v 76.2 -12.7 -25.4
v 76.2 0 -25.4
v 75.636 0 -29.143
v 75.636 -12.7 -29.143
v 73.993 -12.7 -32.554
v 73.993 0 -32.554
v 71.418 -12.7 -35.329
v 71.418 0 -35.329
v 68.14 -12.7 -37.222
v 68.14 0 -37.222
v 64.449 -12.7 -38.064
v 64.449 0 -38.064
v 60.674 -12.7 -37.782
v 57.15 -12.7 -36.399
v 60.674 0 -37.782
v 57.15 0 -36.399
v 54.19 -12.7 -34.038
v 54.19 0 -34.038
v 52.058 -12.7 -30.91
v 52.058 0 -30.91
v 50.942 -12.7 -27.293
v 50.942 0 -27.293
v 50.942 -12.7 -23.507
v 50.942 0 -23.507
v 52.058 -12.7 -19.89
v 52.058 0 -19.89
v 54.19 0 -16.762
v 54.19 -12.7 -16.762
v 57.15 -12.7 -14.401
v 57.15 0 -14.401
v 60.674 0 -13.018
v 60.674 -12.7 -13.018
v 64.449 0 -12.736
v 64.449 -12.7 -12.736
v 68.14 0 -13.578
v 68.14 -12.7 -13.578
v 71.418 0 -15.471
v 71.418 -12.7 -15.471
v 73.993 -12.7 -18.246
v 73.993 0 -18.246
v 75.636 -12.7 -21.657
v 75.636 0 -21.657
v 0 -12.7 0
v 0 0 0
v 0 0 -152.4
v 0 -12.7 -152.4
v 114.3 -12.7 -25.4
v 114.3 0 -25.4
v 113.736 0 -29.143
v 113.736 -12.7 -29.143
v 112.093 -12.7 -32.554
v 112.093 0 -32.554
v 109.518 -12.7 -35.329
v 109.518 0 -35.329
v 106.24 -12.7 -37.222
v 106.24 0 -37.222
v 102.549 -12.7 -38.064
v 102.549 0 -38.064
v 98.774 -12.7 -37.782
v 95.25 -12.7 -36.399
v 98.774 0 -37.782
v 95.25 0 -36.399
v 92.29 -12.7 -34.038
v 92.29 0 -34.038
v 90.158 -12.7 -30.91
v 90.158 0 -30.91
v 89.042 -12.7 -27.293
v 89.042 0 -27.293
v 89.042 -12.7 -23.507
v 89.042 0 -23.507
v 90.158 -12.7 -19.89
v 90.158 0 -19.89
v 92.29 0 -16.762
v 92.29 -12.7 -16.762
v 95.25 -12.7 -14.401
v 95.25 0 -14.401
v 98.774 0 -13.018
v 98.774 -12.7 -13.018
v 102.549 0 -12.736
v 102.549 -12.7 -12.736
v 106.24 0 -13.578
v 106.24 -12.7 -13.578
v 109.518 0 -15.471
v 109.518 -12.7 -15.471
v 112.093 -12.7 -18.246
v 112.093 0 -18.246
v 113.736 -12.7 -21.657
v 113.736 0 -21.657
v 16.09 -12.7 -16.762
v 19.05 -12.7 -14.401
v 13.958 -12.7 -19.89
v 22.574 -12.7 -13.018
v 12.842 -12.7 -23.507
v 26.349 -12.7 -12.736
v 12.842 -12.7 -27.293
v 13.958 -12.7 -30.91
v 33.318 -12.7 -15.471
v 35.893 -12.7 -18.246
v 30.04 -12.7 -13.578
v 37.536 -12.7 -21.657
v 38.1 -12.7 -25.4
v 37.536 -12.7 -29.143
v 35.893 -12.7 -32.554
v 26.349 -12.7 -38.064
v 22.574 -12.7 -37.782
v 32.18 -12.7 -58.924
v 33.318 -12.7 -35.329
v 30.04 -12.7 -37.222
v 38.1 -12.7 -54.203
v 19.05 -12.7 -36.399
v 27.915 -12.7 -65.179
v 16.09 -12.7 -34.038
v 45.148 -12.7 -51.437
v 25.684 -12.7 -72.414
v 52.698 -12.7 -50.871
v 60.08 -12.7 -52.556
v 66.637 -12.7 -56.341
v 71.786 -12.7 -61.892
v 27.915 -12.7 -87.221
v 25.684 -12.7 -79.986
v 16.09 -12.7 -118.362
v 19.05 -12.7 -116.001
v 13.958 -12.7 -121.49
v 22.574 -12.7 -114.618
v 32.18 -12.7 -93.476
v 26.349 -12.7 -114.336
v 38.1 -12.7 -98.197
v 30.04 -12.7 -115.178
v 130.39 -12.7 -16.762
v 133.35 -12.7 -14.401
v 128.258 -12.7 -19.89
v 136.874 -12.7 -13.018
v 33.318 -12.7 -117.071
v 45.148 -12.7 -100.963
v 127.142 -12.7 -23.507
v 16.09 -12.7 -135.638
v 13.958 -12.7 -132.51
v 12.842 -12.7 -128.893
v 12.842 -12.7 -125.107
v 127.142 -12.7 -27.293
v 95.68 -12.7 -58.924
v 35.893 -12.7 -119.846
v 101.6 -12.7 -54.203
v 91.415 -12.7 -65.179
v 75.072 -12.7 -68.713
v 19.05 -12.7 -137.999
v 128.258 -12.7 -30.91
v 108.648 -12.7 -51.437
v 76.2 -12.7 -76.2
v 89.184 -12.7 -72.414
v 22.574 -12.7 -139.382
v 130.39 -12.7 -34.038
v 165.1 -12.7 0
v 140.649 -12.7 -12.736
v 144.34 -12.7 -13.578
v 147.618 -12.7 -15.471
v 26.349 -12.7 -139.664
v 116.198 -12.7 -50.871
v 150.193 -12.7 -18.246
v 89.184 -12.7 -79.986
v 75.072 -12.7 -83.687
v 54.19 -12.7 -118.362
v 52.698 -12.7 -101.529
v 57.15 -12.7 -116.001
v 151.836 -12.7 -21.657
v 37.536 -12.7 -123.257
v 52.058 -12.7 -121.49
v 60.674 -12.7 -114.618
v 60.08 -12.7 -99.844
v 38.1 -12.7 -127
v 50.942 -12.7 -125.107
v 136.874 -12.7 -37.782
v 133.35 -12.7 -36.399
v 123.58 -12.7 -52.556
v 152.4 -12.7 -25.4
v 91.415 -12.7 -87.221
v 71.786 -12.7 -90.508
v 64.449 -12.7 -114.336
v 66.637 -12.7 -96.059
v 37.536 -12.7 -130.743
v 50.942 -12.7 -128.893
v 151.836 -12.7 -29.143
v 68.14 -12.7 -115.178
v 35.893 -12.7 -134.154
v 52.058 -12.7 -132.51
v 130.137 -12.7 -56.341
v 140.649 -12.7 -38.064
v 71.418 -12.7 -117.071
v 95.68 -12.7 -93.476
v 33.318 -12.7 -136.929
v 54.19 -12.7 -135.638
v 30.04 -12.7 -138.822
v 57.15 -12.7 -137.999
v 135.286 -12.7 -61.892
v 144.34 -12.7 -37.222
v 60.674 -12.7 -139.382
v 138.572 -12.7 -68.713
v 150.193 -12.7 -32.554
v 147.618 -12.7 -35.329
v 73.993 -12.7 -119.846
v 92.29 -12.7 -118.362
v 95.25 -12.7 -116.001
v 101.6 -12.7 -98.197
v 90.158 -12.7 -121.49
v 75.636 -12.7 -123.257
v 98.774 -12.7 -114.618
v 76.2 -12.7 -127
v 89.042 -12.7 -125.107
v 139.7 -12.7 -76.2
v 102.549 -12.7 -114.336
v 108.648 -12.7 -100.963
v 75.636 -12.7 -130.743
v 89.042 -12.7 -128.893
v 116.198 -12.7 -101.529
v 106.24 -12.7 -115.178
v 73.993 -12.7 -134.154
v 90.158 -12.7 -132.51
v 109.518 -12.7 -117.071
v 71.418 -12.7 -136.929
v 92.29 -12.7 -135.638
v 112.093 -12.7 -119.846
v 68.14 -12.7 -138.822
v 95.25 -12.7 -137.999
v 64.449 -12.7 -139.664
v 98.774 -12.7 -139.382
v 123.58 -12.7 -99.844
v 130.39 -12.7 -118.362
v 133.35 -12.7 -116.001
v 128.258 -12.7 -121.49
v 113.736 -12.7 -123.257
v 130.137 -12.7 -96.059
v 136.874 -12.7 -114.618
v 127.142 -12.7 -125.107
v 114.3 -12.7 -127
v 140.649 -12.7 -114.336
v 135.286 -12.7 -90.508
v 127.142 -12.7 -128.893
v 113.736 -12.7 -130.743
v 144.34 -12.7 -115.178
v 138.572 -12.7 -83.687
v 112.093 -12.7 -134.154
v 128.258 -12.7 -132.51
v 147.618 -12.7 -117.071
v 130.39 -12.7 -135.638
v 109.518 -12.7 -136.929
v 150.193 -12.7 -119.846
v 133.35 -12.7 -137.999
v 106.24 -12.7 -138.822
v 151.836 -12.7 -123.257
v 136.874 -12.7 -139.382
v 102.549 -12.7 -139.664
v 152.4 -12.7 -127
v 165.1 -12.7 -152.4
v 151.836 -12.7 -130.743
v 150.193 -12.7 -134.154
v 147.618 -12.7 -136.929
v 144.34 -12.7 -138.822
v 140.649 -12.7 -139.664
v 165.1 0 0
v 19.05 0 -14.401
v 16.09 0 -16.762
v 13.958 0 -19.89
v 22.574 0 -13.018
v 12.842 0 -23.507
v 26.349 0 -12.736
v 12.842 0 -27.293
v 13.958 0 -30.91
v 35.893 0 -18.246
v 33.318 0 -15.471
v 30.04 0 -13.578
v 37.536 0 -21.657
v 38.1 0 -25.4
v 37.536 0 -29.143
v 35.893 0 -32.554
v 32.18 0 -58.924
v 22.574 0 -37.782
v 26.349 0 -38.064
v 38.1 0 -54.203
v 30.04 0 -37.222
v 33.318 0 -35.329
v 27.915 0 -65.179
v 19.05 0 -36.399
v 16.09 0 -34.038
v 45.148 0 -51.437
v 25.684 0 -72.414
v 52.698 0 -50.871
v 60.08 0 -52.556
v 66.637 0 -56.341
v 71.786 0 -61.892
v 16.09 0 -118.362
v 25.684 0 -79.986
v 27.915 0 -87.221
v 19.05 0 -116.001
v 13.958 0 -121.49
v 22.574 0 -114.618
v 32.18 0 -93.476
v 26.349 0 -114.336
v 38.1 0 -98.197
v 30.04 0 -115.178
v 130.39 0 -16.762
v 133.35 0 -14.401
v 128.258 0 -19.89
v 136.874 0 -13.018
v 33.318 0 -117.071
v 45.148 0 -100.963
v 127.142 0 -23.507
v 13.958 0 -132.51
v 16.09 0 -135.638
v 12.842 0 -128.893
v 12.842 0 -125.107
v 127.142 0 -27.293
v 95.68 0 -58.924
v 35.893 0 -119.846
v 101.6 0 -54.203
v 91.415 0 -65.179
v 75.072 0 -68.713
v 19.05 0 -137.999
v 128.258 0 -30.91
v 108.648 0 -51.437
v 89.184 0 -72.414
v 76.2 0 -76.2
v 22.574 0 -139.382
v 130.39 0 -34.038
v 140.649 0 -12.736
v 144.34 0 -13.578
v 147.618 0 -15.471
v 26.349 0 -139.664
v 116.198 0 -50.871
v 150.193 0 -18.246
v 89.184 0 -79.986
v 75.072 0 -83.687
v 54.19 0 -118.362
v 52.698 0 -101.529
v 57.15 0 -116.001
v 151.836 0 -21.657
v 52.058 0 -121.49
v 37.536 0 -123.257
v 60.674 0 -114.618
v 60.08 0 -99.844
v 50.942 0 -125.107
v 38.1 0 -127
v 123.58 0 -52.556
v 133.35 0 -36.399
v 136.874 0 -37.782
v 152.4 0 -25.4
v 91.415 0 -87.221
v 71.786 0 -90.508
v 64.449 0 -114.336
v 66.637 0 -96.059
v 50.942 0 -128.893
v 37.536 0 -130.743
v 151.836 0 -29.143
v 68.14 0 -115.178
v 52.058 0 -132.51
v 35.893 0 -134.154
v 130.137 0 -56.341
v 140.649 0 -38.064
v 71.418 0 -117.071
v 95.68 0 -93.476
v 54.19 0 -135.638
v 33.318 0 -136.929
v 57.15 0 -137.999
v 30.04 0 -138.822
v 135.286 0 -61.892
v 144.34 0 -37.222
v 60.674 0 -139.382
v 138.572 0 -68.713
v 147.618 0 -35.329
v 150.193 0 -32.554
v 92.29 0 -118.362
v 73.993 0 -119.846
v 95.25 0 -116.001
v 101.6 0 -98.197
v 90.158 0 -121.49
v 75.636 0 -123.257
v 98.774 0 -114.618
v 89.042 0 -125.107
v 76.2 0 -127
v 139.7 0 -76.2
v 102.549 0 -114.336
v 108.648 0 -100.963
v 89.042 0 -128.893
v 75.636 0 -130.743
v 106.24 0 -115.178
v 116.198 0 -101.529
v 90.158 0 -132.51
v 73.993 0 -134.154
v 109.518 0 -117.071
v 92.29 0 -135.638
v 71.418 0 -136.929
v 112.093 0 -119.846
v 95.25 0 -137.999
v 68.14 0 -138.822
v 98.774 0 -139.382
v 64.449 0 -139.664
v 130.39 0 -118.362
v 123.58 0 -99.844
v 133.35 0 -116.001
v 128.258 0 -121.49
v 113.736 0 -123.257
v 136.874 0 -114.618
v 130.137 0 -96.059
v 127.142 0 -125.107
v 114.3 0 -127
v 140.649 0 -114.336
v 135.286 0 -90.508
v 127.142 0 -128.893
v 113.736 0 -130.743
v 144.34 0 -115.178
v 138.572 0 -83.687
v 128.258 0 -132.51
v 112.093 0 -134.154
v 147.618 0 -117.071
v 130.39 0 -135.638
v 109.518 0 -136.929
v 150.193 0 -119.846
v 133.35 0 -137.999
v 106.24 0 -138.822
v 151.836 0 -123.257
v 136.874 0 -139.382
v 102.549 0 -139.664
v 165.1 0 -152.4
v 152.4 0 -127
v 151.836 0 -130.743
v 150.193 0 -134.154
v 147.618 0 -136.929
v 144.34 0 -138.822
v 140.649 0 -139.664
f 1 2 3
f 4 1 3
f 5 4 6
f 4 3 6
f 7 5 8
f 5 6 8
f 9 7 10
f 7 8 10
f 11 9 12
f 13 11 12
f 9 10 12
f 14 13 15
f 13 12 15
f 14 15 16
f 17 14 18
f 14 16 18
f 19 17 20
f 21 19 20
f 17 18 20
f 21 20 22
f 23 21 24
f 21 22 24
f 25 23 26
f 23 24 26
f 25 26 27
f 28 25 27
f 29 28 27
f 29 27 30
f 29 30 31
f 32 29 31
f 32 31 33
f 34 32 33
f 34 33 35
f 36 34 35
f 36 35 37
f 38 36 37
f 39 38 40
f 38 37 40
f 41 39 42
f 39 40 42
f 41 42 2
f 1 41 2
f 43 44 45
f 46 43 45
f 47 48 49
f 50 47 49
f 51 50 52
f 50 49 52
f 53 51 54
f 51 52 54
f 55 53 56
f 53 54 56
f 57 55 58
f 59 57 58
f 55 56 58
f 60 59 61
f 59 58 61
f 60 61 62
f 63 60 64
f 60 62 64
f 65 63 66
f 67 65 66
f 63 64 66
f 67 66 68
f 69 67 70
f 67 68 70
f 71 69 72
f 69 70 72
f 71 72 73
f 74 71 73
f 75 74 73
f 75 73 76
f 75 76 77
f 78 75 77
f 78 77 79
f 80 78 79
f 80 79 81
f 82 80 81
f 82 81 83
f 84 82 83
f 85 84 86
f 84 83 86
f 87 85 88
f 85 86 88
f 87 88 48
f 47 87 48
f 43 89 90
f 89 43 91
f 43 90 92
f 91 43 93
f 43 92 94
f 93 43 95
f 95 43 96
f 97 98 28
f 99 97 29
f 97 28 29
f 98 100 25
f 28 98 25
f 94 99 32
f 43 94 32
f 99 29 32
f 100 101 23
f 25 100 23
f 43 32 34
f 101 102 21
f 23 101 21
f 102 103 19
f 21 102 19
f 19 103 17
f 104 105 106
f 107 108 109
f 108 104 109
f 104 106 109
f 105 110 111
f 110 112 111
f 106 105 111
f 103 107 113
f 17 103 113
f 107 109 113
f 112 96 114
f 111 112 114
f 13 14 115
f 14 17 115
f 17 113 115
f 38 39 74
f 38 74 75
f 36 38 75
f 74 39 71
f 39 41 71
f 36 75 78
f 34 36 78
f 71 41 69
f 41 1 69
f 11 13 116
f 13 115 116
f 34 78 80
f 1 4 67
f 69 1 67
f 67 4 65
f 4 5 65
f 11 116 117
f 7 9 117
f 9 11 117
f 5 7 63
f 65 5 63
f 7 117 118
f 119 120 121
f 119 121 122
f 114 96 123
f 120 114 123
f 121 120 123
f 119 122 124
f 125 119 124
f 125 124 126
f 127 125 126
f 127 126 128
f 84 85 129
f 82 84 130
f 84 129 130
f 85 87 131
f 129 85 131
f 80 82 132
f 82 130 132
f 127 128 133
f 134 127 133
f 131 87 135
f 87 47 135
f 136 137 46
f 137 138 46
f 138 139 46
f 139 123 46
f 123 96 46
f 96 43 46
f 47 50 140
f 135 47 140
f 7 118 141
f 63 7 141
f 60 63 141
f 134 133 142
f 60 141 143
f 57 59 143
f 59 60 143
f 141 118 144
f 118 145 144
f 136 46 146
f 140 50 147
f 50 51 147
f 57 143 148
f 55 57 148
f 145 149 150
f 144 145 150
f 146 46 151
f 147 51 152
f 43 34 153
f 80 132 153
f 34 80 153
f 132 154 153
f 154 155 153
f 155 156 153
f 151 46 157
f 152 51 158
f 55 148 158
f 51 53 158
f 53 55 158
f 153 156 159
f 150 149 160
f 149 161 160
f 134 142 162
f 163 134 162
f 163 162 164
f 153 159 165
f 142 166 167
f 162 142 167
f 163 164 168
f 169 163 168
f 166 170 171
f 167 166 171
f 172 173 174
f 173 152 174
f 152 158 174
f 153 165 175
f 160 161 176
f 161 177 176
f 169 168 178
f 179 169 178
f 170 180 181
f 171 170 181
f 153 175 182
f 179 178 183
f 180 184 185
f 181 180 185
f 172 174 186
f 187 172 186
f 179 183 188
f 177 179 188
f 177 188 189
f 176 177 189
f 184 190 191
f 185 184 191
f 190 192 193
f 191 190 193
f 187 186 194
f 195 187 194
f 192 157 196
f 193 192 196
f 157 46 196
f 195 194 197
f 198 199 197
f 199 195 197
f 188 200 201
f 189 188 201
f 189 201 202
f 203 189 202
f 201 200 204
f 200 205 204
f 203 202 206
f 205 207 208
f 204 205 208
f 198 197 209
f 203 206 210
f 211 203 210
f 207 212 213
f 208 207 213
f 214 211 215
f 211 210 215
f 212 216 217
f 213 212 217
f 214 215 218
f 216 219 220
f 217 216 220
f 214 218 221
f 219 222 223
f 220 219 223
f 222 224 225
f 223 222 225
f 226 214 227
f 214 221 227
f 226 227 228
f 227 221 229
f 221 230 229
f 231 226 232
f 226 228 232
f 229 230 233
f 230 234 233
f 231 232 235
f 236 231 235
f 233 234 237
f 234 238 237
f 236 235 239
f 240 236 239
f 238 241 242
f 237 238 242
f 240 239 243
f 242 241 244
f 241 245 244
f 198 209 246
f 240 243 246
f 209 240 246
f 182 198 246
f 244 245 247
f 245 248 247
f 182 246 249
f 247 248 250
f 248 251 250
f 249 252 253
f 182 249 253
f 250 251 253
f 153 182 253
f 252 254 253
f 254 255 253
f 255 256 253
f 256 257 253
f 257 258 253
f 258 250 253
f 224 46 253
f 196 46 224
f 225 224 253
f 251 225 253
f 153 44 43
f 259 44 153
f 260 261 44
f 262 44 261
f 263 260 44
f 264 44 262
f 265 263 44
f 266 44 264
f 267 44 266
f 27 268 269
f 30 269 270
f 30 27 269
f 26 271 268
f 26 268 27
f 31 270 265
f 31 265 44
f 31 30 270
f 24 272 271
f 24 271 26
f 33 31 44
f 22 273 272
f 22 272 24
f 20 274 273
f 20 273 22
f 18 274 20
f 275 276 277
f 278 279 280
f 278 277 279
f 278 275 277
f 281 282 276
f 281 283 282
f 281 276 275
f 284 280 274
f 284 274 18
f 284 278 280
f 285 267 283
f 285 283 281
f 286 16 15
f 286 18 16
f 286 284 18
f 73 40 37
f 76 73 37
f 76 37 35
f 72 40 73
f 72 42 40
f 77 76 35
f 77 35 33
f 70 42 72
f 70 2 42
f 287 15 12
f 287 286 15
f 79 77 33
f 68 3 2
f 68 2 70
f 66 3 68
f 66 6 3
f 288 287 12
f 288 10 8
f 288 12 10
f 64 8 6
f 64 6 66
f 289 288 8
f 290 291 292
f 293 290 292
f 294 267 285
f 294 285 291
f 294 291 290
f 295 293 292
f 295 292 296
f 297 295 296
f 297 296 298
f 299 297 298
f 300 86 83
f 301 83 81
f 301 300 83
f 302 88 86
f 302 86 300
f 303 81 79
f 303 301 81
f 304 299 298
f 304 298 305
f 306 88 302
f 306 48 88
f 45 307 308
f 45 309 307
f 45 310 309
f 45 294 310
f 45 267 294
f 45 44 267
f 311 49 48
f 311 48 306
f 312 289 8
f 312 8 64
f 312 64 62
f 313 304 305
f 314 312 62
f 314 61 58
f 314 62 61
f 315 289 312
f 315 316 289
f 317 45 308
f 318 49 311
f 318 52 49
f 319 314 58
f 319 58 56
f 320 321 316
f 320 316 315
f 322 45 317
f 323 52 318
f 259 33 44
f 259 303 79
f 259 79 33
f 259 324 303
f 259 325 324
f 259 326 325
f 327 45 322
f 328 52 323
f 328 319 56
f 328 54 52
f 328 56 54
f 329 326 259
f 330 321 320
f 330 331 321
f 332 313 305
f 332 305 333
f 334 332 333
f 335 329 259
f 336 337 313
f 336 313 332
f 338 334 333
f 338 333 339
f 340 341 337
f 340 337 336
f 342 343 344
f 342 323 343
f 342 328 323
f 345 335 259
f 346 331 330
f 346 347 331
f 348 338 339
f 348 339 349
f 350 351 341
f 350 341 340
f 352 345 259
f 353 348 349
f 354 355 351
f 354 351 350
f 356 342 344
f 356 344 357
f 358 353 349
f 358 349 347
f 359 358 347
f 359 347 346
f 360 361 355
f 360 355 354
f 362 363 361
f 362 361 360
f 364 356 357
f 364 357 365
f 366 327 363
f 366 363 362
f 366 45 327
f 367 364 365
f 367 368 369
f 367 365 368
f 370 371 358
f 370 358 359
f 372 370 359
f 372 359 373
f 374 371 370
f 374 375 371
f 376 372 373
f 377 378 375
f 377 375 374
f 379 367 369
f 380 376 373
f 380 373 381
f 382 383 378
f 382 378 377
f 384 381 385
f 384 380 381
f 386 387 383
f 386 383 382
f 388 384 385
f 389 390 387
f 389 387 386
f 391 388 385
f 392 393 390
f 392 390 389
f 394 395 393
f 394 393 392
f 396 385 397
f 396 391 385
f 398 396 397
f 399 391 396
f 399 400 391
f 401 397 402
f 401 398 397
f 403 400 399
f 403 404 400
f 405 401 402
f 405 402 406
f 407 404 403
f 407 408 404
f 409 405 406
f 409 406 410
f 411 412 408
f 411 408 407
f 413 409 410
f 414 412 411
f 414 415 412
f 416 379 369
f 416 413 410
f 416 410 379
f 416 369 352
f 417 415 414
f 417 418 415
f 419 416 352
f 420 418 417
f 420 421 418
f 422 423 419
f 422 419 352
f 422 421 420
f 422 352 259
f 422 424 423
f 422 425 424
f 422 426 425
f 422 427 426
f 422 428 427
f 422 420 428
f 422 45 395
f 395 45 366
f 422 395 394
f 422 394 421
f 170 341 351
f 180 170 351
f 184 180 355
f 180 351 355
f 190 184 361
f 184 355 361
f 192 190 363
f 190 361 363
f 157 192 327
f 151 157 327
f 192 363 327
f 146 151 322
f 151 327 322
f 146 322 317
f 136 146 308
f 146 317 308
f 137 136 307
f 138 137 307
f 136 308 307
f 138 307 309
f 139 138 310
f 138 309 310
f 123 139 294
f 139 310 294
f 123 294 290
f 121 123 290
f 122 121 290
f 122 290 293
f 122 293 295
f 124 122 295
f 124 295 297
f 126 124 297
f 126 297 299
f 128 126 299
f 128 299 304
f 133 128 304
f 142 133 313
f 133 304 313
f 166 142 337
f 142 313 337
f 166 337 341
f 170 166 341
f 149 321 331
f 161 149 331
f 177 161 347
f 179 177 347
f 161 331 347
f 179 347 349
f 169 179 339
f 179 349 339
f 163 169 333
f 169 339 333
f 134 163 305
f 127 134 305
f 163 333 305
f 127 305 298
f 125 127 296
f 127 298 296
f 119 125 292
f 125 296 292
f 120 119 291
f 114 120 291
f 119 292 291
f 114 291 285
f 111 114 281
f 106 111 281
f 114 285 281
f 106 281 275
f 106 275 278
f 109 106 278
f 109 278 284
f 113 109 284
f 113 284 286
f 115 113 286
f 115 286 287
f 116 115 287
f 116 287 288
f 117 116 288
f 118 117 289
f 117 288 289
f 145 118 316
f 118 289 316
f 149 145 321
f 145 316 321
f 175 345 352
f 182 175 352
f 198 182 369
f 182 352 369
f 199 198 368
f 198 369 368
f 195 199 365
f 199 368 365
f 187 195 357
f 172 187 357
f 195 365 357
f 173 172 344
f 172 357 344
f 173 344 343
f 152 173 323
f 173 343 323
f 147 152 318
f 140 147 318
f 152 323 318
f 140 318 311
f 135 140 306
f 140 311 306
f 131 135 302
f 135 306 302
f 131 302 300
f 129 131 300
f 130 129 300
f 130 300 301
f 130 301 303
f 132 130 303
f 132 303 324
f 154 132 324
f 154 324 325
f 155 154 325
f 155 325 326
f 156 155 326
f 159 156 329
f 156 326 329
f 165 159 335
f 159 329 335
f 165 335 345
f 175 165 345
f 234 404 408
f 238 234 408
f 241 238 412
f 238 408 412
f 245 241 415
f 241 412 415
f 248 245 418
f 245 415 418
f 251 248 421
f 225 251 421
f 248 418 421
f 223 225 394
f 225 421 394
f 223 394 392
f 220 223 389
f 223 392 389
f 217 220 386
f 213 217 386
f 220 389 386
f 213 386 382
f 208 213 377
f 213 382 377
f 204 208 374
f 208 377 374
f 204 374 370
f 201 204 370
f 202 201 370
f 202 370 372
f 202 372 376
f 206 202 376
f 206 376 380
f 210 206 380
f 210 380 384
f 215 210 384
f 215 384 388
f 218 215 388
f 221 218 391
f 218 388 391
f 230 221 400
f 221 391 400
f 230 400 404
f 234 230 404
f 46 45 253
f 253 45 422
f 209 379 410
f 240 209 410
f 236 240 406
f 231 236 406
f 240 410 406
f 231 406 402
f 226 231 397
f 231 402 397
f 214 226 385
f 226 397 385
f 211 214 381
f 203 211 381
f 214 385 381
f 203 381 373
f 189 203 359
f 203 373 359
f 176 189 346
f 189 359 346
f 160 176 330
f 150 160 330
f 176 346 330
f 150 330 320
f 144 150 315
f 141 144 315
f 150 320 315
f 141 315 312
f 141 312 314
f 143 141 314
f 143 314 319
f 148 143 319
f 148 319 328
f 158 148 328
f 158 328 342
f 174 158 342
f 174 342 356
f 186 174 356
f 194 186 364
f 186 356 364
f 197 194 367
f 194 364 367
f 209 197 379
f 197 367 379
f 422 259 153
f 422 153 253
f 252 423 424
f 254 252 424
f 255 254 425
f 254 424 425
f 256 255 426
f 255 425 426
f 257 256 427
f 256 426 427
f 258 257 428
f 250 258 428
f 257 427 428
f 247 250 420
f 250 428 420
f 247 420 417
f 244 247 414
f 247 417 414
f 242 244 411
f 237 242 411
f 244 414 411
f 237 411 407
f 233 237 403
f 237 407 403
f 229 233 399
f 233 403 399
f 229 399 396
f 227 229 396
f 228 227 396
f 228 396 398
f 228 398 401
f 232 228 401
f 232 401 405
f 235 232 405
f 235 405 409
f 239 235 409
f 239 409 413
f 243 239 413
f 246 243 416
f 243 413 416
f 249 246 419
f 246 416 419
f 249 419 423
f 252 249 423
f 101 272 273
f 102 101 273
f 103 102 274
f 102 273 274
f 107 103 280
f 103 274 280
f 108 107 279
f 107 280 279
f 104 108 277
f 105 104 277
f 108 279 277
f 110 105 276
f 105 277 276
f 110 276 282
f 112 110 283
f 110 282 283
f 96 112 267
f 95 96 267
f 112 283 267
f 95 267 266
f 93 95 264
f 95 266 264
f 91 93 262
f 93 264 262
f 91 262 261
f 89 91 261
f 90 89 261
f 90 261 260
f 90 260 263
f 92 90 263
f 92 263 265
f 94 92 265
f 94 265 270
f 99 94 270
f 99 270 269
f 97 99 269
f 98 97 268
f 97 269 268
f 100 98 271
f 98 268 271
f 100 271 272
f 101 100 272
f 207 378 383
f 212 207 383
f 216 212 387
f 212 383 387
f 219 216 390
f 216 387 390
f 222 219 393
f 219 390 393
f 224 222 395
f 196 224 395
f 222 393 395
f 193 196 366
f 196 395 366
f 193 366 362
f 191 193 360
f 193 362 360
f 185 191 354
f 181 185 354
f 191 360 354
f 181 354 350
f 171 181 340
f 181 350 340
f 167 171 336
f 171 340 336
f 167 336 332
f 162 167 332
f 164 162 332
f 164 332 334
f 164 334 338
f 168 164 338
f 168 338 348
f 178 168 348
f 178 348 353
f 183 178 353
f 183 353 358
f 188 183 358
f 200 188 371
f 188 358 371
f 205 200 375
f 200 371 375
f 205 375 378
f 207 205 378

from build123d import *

# Parameters (mm, degrees)
SKETCH1_W           = 165.1
SKETCH1_H           = 152.4
BOSS_EXTRUDE1_DEPTH = 12.7
SKETCH2_R           = 12.7
CUT_EXTRUDE1_DEPTH  = 12.7
SKETCH3_R           = 25.4
CUT_EXTRUDE2_DEPTH  = 12.7


with BuildPart() as part:
    # Sketch1 → Boss-Extrude1 (new body)
    with BuildSketch(Plane(origin=(0, 0, 0), x_dir=(1, 0, 0), z_dir=(0, 1, 0))):
        with Locations((82.55, 76.2)):
            Rectangle(SKETCH1_W, SKETCH1_H)
    extrude(amount=-BOSS_EXTRUDE1_DEPTH)

    # Sketch2 → Cut-Extrude1 (cut)
    with BuildSketch(Plane(origin=(0, 0, 0), x_dir=(1, 0, 0), z_dir=(0, 1, 0))):
        with Locations((25.4, 127)):
            Circle(SKETCH2_R)
        with Locations((63.5, 127)):
            Circle(SKETCH2_R)
        with Locations((101.6, 127)):
            Circle(SKETCH2_R)
        with Locations((139.7, 127)):
            Circle(SKETCH2_R)
        with Locations((63.5, 25.4)):
            Circle(SKETCH2_R)
        with Locations((101.6, 25.4)):
            Circle(SKETCH2_R)
        with Locations((139.7, 25.4)):
            Circle(SKETCH2_R)
        with Locations((25.4, 25.4)):
            Circle(SKETCH2_R)
    extrude(amount=-CUT_EXTRUDE1_DEPTH, mode=Mode.SUBTRACT)

    # Sketch3 → Cut-Extrude2 (cut)
    with BuildSketch(Plane(origin=(0, 0, 0), x_dir=(1, 0, 0), z_dir=(0, 1, 0))):
        with Locations((50.8, 76.2)):
            Circle(SKETCH3_R)
        with Locations((114.3, 76.2)):
            Circle(SKETCH3_R)
    extrude(amount=-CUT_EXTRUDE2_DEPTH, mode=Mode.SUBTRACT)


solid = part.part
